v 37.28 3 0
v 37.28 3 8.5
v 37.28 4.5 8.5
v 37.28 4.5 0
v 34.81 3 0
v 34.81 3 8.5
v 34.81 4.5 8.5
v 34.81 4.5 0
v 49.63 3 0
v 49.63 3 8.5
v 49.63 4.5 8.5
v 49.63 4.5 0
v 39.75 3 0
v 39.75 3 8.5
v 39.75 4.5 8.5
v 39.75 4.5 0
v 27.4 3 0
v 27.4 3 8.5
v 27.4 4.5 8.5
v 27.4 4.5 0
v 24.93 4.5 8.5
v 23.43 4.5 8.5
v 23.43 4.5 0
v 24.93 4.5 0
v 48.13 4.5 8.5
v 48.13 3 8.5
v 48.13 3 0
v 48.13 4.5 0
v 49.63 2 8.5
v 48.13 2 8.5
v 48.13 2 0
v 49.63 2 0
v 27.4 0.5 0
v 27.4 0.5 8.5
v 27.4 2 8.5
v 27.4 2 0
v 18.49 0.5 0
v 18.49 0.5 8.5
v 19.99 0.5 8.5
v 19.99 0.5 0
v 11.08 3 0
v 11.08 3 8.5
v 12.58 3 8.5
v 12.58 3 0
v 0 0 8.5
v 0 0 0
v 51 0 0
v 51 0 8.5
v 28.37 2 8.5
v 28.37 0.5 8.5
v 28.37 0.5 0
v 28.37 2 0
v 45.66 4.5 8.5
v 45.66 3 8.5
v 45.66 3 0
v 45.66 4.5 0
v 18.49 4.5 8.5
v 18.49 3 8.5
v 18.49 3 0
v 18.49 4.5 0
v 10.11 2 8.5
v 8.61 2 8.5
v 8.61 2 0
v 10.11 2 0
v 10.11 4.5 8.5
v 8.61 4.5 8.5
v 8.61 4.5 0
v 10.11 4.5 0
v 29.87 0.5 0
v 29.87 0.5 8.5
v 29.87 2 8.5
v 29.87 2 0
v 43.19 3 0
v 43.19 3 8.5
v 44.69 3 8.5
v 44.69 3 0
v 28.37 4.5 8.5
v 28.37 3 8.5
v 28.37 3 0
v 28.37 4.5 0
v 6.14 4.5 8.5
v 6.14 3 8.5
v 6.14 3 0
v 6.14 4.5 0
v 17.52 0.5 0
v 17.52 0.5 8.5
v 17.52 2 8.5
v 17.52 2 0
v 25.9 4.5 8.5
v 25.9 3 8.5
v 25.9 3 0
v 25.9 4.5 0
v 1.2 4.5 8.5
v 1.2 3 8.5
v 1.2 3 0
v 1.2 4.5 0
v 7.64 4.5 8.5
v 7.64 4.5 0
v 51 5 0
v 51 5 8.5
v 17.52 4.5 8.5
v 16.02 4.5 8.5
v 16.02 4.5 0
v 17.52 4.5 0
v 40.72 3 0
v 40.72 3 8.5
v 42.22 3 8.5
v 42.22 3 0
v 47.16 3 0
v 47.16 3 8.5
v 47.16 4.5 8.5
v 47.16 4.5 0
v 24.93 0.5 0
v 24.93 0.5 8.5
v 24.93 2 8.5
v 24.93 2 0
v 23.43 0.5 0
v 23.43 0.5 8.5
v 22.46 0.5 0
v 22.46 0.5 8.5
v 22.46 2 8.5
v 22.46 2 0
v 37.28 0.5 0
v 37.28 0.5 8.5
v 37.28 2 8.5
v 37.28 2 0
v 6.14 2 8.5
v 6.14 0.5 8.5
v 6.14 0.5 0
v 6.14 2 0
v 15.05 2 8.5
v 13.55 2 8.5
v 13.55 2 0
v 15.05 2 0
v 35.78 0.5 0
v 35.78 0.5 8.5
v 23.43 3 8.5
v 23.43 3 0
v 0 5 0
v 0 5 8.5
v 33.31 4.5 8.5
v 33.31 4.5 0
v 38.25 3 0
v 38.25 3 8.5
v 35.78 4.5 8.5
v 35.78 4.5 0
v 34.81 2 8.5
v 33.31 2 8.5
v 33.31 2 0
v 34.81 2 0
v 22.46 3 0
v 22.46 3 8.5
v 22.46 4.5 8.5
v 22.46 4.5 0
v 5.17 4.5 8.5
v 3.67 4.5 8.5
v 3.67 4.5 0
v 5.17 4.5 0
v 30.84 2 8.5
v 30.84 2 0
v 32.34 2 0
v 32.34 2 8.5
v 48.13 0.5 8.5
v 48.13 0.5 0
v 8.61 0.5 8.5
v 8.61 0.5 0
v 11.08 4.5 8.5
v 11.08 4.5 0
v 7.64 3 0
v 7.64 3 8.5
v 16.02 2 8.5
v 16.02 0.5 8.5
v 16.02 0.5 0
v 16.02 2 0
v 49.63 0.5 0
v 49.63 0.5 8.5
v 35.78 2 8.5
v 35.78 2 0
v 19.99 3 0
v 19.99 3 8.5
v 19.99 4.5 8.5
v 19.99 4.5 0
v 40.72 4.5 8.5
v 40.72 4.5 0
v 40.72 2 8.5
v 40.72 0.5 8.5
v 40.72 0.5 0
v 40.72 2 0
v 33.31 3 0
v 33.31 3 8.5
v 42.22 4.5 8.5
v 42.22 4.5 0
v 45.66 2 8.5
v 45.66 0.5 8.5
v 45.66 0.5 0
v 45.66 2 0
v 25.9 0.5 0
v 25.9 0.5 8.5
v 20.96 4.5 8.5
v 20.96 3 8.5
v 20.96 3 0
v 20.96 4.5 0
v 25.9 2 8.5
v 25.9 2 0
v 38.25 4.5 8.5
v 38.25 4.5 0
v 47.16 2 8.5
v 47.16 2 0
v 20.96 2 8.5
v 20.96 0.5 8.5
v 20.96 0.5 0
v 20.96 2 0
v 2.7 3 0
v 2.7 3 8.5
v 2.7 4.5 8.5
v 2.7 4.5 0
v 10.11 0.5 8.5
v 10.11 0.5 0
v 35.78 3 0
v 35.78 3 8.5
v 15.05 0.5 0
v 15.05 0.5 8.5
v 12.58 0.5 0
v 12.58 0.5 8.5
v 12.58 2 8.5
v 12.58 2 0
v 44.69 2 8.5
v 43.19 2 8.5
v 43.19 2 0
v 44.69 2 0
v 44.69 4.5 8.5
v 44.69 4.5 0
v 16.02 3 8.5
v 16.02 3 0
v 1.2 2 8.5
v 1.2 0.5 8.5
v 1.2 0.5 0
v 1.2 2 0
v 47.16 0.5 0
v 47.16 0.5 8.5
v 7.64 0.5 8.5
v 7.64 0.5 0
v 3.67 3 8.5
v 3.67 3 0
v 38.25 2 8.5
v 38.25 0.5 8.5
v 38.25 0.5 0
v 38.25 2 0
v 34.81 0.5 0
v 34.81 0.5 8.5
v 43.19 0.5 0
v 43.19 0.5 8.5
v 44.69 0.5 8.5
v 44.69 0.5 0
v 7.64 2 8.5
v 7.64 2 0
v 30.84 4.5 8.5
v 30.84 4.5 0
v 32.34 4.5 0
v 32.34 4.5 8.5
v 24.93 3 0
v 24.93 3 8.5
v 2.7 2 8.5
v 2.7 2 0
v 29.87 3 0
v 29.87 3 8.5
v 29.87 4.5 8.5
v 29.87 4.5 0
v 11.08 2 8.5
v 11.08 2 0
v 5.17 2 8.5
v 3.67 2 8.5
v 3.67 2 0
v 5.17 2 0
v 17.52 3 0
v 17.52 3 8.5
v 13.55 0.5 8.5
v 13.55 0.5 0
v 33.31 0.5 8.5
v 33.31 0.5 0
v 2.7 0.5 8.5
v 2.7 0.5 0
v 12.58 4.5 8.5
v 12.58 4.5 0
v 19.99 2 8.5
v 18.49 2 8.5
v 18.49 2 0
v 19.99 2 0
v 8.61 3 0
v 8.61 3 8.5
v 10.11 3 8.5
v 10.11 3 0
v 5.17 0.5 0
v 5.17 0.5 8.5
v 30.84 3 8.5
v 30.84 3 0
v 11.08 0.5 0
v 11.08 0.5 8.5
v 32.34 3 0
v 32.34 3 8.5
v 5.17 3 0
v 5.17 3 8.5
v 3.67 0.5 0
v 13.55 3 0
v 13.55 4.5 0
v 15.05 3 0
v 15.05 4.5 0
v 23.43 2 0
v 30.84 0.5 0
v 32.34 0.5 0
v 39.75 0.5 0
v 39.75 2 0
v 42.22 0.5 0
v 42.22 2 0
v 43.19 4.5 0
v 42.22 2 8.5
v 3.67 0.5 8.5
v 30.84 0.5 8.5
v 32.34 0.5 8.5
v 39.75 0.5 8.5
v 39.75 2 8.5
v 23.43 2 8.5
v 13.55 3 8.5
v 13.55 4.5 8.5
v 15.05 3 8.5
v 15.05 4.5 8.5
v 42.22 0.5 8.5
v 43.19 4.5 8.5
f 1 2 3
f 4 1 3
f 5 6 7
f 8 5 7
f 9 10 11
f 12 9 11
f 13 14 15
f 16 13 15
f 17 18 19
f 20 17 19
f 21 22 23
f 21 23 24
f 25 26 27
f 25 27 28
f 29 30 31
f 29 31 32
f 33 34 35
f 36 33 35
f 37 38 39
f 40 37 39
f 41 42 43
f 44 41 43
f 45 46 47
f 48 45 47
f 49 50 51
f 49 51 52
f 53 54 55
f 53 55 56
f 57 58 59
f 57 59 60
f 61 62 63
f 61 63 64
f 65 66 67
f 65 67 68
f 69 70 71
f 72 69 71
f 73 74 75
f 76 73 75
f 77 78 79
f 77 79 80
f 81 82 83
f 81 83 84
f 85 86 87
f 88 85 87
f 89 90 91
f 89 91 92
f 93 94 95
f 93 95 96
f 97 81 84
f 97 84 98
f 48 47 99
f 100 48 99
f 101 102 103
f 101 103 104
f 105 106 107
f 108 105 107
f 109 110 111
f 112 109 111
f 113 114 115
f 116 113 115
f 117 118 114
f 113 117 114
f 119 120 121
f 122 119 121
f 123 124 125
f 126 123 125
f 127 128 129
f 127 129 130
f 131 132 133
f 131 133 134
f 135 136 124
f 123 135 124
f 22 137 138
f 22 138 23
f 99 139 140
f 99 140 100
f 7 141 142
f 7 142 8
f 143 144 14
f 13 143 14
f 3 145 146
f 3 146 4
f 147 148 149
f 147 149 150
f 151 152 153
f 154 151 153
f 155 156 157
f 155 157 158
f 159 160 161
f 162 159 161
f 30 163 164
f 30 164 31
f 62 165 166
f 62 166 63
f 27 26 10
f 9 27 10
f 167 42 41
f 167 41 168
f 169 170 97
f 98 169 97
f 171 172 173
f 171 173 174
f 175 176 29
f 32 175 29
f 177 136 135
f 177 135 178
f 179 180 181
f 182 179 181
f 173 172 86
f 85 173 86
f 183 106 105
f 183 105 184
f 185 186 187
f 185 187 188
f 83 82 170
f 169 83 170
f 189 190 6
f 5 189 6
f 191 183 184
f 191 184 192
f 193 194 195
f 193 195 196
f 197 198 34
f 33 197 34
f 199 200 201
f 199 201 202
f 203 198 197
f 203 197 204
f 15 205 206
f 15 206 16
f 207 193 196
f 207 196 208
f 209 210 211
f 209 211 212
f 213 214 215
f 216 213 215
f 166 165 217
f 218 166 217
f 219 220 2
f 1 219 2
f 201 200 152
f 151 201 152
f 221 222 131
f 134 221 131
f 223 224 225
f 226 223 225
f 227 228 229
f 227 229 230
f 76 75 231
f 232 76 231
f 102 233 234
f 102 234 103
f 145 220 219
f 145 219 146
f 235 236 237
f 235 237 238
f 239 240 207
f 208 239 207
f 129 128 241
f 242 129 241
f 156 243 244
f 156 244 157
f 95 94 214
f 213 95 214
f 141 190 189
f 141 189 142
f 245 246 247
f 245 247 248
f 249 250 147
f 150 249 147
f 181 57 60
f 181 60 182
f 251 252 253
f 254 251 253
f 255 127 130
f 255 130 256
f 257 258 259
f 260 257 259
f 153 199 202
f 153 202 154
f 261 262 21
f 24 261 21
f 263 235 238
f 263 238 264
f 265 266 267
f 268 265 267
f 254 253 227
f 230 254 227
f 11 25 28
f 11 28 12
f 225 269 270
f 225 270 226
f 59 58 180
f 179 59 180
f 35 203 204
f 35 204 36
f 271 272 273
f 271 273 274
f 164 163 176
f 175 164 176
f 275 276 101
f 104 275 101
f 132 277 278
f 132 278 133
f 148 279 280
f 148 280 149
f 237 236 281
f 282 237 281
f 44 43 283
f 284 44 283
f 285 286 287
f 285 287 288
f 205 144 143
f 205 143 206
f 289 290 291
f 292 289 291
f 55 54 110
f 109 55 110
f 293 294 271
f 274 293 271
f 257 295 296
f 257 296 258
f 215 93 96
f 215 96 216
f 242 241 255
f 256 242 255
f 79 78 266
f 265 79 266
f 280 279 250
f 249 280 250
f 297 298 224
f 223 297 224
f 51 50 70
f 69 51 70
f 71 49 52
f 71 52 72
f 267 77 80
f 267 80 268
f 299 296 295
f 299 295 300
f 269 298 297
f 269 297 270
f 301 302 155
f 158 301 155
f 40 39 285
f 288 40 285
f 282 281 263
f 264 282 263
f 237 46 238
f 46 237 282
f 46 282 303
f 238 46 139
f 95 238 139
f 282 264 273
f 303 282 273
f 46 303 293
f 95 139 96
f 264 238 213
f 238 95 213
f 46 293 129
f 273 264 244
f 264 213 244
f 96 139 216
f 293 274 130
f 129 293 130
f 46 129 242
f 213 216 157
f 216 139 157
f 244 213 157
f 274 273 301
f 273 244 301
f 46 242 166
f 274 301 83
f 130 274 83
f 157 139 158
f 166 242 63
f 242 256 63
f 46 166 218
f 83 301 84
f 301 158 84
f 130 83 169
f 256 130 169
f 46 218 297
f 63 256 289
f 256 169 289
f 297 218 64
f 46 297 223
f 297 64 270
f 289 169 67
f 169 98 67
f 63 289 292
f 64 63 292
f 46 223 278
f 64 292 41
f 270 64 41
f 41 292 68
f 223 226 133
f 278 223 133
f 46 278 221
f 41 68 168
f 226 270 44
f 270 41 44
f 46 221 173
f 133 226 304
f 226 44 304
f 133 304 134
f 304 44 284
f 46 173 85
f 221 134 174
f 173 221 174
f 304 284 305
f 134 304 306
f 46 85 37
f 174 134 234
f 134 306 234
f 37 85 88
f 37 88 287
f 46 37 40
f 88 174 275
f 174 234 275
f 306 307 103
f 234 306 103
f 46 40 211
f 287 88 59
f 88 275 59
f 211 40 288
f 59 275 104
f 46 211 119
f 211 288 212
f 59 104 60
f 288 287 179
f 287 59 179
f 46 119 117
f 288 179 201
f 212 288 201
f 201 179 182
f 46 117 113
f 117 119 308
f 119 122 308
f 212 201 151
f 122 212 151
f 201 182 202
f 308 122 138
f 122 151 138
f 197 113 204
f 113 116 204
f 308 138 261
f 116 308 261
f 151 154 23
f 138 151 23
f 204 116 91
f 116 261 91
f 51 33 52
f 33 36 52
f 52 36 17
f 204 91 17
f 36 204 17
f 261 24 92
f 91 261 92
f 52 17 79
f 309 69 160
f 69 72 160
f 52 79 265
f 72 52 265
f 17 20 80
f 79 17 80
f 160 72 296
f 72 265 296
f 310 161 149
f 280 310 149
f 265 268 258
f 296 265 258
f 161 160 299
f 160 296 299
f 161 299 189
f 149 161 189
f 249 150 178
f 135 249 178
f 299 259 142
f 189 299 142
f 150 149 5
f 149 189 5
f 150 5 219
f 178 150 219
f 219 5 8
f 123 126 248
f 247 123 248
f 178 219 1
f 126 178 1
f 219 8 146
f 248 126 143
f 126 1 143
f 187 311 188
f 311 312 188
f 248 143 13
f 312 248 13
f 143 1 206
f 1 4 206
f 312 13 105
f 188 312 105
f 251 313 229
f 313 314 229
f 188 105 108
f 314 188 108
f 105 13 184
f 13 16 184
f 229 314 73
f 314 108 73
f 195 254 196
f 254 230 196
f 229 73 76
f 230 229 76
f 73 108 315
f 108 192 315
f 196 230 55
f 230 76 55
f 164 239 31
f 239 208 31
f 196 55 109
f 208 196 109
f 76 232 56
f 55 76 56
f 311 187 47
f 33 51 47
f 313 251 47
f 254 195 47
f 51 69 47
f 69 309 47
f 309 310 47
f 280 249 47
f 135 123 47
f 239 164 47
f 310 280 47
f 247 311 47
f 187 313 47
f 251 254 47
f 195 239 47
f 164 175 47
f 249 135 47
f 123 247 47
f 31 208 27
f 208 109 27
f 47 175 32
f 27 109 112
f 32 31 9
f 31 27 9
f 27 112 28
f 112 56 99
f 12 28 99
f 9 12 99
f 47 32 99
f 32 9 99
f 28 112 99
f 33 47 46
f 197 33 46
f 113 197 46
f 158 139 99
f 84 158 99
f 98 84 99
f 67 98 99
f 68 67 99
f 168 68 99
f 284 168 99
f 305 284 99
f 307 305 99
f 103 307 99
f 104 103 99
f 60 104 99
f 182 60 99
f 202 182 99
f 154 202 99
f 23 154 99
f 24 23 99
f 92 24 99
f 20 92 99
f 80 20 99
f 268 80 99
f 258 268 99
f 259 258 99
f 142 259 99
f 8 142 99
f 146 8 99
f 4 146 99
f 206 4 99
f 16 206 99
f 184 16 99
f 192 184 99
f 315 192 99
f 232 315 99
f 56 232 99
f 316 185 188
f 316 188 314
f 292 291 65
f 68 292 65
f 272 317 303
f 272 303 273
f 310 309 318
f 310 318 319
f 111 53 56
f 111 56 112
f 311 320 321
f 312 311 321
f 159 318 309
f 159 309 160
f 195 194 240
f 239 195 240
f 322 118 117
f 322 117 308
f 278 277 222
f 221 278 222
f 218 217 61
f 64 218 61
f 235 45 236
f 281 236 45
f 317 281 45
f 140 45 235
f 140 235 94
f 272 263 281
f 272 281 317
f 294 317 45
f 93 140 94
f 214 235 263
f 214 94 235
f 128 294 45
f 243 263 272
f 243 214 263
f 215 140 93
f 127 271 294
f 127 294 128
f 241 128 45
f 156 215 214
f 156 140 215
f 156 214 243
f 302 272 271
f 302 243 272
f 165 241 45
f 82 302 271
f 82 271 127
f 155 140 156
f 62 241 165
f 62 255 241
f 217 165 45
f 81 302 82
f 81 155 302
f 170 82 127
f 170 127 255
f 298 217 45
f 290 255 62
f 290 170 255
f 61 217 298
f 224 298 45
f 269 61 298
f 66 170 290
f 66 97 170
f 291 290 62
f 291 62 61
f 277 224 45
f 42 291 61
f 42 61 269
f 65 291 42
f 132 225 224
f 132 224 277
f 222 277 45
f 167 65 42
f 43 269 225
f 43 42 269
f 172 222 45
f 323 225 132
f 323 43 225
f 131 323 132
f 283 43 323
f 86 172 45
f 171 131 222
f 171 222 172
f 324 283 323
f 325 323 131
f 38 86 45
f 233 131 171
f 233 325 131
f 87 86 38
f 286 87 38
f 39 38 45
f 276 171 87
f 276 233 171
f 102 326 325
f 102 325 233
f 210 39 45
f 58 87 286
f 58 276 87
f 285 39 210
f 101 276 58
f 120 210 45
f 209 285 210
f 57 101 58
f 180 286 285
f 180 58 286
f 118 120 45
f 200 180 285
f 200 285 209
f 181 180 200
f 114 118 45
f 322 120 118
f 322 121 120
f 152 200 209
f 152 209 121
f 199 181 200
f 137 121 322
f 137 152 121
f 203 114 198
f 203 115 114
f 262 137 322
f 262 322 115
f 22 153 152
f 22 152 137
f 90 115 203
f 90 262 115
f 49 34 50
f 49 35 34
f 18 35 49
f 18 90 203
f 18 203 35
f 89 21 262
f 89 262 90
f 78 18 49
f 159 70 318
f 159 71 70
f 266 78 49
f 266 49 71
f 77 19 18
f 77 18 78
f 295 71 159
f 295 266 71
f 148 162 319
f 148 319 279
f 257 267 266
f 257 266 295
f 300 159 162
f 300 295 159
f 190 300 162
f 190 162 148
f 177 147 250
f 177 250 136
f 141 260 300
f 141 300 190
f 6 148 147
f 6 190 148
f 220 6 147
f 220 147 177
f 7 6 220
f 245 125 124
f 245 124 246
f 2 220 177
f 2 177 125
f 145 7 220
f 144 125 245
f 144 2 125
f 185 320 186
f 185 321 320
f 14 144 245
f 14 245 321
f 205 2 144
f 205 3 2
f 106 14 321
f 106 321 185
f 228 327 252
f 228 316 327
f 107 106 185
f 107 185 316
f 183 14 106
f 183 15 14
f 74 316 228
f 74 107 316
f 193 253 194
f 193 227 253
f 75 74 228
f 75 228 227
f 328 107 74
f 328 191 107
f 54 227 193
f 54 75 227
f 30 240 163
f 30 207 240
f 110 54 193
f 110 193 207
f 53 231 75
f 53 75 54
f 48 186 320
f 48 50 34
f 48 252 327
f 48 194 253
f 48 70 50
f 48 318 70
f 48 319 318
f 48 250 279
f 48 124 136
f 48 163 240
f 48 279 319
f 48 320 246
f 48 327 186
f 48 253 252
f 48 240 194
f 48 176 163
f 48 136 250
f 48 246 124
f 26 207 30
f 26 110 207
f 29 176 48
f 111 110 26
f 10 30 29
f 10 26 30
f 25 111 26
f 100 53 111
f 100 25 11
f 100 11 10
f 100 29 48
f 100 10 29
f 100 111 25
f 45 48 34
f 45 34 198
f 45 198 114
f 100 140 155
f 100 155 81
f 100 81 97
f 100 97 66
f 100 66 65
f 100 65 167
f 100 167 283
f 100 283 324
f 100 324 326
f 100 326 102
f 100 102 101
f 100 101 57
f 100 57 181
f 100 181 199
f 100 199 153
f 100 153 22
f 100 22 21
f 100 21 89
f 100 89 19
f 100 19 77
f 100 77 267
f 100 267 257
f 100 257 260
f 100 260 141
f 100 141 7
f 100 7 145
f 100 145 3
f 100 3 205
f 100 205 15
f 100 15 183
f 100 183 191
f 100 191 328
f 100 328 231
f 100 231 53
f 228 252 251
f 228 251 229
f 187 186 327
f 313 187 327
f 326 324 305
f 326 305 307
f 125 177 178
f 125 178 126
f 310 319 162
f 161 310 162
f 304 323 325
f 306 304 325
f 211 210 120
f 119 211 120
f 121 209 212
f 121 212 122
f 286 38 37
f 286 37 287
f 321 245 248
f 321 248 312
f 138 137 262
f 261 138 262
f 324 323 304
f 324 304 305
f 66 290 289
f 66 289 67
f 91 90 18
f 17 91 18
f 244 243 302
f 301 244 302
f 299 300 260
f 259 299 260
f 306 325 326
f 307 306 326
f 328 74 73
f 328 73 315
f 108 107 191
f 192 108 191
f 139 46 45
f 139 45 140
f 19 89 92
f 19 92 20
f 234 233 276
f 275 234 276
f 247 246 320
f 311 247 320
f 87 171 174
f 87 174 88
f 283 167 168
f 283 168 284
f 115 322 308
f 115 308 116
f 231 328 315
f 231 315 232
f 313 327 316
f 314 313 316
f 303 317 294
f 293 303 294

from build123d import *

# Parameters (mm, degrees)
F0_W     = 51
F0_H     = 5
F0_W_2   = 1.5
F0_H_2   = 1.5
F1_DEPTH = 8.5


with BuildPart() as f1:
    # F0 (on Top) → F1 (new body)
    with BuildSketch(Plane.XY):
        with Locations((25.5, 2.5)):
            Rectangle(F0_W, F0_H)
        with Locations((1.95, 1.25)):
            Rectangle(F0_W_2, F0_H_2, mode=Mode.SUBTRACT)
        with Locations((4.42, 1.25)):
            Rectangle(F0_W_2, F0_H_2, mode=Mode.SUBTRACT)
        with Locations((6.89, 1.25)):
            Rectangle(F0_W_2, F0_H_2, mode=Mode.SUBTRACT)
        with Locations((9.36, 1.25)):
            Rectangle(F0_W_2, F0_H_2, mode=Mode.SUBTRACT)
        with Locations((11.83, 1.25)):
            Rectangle(F0_W_2, F0_H_2, mode=Mode.SUBTRACT)
        with Locations((14.3, 1.25)):
            Rectangle(F0_W_2, F0_H_2, mode=Mode.SUBTRACT)
        with Locations((16.77, 1.25)):
            Rectangle(F0_W_2, F0_H_2, mode=Mode.SUBTRACT)
        with Locations((19.24, 1.25)):
            Rectangle(F0_W_2, F0_H_2, mode=Mode.SUBTRACT)
        with Locations((21.71, 1.25)):
            Rectangle(F0_W_2, F0_H_2, mode=Mode.SUBTRACT)
        with Locations((24.18, 1.25)):
            Rectangle(F0_W_2, F0_H_2, mode=Mode.SUBTRACT)
        with Locations((26.65, 1.25)):
            Rectangle(F0_W_2, F0_H_2, mode=Mode.SUBTRACT)
        with Locations((29.12, 1.25)):
            Rectangle(F0_W_2, F0_H_2, mode=Mode.SUBTRACT)
        with Locations((31.59, 1.25)):
            Rectangle(F0_W_2, F0_H_2, mode=Mode.SUBTRACT)
        with Locations((34.06, 1.25)):
            Rectangle(F0_W_2, F0_H_2, mode=Mode.SUBTRACT)
        with Locations((36.53, 1.25)):
            Rectangle(F0_W_2, F0_H_2, mode=Mode.SUBTRACT)
        with Locations((39, 1.25)):
            Rectangle(F0_W_2, F0_H_2, mode=Mode.SUBTRACT)
        with Locations((41.47, 1.25)):
            Rectangle(F0_W_2, F0_H_2, mode=Mode.SUBTRACT)
        with Locations((43.94, 1.25)):
            Rectangle(F0_W_2, F0_H_2, mode=Mode.SUBTRACT)
        with Locations((46.41, 1.25)):
            Rectangle(F0_W_2, F0_H_2, mode=Mode.SUBTRACT)
        with Locations((48.88, 1.25)):
            Rectangle(F0_W_2, F0_H_2, mode=Mode.SUBTRACT)
        with Locations((1.95, 3.75)):
            Rectangle(F0_W_2, F0_H_2, mode=Mode.SUBTRACT)
        with Locations((4.42, 3.75)):
            Rectangle(F0_W_2, F0_H_2, mode=Mode.SUBTRACT)
        with Locations((6.89, 3.75)):
            Rectangle(F0_W_2, F0_H_2, mode=Mode.SUBTRACT)
        with Locations((9.36, 3.75)):
            Rectangle(F0_W_2, F0_H_2, mode=Mode.SUBTRACT)
        with Locations((11.83, 3.75)):
            Rectangle(F0_W_2, F0_H_2, mode=Mode.SUBTRACT)
        with Locations((14.3, 3.75)):
            Rectangle(F0_W_2, F0_H_2, mode=Mode.SUBTRACT)
        with Locations((16.77, 3.75)):
            Rectangle(F0_W_2, F0_H_2, mode=Mode.SUBTRACT)
        with Locations((19.24, 3.75)):
            Rectangle(F0_W_2, F0_H_2, mode=Mode.SUBTRACT)
        with Locations((21.71, 3.75)):
            Rectangle(F0_W_2, F0_H_2, mode=Mode.SUBTRACT)
        with Locations((24.18, 3.75)):
            Rectangle(F0_W_2, F0_H_2, mode=Mode.SUBTRACT)
        with Locations((26.65, 3.75)):
            Rectangle(F0_W_2, F0_H_2, mode=Mode.SUBTRACT)
        with Locations((29.12, 3.75)):
            Rectangle(F0_W_2, F0_H_2, mode=Mode.SUBTRACT)
        with Locations((31.59, 3.75)):
            Rectangle(F0_W_2, F0_H_2, mode=Mode.SUBTRACT)
        with Locations((34.06, 3.75)):
            Rectangle(F0_W_2, F0_H_2, mode=Mode.SUBTRACT)
        with Locations((36.53, 3.75)):
            Rectangle(F0_W_2, F0_H_2, mode=Mode.SUBTRACT)
        with Locations((39, 3.75)):
            Rectangle(F0_W_2, F0_H_2, mode=Mode.SUBTRACT)
        with Locations((41.47, 3.75)):
            Rectangle(F0_W_2, F0_H_2, mode=Mode.SUBTRACT)
        with Locations((43.94, 3.75)):
            Rectangle(F0_W_2, F0_H_2, mode=Mode.SUBTRACT)
        with Locations((46.41, 3.75)):
            Rectangle(F0_W_2, F0_H_2, mode=Mode.SUBTRACT)
        with Locations((48.88, 3.75)):
            Rectangle(F0_W_2, F0_H_2, mode=Mode.SUBTRACT)
    extrude(amount=F1_DEPTH)


solid = f1.part
